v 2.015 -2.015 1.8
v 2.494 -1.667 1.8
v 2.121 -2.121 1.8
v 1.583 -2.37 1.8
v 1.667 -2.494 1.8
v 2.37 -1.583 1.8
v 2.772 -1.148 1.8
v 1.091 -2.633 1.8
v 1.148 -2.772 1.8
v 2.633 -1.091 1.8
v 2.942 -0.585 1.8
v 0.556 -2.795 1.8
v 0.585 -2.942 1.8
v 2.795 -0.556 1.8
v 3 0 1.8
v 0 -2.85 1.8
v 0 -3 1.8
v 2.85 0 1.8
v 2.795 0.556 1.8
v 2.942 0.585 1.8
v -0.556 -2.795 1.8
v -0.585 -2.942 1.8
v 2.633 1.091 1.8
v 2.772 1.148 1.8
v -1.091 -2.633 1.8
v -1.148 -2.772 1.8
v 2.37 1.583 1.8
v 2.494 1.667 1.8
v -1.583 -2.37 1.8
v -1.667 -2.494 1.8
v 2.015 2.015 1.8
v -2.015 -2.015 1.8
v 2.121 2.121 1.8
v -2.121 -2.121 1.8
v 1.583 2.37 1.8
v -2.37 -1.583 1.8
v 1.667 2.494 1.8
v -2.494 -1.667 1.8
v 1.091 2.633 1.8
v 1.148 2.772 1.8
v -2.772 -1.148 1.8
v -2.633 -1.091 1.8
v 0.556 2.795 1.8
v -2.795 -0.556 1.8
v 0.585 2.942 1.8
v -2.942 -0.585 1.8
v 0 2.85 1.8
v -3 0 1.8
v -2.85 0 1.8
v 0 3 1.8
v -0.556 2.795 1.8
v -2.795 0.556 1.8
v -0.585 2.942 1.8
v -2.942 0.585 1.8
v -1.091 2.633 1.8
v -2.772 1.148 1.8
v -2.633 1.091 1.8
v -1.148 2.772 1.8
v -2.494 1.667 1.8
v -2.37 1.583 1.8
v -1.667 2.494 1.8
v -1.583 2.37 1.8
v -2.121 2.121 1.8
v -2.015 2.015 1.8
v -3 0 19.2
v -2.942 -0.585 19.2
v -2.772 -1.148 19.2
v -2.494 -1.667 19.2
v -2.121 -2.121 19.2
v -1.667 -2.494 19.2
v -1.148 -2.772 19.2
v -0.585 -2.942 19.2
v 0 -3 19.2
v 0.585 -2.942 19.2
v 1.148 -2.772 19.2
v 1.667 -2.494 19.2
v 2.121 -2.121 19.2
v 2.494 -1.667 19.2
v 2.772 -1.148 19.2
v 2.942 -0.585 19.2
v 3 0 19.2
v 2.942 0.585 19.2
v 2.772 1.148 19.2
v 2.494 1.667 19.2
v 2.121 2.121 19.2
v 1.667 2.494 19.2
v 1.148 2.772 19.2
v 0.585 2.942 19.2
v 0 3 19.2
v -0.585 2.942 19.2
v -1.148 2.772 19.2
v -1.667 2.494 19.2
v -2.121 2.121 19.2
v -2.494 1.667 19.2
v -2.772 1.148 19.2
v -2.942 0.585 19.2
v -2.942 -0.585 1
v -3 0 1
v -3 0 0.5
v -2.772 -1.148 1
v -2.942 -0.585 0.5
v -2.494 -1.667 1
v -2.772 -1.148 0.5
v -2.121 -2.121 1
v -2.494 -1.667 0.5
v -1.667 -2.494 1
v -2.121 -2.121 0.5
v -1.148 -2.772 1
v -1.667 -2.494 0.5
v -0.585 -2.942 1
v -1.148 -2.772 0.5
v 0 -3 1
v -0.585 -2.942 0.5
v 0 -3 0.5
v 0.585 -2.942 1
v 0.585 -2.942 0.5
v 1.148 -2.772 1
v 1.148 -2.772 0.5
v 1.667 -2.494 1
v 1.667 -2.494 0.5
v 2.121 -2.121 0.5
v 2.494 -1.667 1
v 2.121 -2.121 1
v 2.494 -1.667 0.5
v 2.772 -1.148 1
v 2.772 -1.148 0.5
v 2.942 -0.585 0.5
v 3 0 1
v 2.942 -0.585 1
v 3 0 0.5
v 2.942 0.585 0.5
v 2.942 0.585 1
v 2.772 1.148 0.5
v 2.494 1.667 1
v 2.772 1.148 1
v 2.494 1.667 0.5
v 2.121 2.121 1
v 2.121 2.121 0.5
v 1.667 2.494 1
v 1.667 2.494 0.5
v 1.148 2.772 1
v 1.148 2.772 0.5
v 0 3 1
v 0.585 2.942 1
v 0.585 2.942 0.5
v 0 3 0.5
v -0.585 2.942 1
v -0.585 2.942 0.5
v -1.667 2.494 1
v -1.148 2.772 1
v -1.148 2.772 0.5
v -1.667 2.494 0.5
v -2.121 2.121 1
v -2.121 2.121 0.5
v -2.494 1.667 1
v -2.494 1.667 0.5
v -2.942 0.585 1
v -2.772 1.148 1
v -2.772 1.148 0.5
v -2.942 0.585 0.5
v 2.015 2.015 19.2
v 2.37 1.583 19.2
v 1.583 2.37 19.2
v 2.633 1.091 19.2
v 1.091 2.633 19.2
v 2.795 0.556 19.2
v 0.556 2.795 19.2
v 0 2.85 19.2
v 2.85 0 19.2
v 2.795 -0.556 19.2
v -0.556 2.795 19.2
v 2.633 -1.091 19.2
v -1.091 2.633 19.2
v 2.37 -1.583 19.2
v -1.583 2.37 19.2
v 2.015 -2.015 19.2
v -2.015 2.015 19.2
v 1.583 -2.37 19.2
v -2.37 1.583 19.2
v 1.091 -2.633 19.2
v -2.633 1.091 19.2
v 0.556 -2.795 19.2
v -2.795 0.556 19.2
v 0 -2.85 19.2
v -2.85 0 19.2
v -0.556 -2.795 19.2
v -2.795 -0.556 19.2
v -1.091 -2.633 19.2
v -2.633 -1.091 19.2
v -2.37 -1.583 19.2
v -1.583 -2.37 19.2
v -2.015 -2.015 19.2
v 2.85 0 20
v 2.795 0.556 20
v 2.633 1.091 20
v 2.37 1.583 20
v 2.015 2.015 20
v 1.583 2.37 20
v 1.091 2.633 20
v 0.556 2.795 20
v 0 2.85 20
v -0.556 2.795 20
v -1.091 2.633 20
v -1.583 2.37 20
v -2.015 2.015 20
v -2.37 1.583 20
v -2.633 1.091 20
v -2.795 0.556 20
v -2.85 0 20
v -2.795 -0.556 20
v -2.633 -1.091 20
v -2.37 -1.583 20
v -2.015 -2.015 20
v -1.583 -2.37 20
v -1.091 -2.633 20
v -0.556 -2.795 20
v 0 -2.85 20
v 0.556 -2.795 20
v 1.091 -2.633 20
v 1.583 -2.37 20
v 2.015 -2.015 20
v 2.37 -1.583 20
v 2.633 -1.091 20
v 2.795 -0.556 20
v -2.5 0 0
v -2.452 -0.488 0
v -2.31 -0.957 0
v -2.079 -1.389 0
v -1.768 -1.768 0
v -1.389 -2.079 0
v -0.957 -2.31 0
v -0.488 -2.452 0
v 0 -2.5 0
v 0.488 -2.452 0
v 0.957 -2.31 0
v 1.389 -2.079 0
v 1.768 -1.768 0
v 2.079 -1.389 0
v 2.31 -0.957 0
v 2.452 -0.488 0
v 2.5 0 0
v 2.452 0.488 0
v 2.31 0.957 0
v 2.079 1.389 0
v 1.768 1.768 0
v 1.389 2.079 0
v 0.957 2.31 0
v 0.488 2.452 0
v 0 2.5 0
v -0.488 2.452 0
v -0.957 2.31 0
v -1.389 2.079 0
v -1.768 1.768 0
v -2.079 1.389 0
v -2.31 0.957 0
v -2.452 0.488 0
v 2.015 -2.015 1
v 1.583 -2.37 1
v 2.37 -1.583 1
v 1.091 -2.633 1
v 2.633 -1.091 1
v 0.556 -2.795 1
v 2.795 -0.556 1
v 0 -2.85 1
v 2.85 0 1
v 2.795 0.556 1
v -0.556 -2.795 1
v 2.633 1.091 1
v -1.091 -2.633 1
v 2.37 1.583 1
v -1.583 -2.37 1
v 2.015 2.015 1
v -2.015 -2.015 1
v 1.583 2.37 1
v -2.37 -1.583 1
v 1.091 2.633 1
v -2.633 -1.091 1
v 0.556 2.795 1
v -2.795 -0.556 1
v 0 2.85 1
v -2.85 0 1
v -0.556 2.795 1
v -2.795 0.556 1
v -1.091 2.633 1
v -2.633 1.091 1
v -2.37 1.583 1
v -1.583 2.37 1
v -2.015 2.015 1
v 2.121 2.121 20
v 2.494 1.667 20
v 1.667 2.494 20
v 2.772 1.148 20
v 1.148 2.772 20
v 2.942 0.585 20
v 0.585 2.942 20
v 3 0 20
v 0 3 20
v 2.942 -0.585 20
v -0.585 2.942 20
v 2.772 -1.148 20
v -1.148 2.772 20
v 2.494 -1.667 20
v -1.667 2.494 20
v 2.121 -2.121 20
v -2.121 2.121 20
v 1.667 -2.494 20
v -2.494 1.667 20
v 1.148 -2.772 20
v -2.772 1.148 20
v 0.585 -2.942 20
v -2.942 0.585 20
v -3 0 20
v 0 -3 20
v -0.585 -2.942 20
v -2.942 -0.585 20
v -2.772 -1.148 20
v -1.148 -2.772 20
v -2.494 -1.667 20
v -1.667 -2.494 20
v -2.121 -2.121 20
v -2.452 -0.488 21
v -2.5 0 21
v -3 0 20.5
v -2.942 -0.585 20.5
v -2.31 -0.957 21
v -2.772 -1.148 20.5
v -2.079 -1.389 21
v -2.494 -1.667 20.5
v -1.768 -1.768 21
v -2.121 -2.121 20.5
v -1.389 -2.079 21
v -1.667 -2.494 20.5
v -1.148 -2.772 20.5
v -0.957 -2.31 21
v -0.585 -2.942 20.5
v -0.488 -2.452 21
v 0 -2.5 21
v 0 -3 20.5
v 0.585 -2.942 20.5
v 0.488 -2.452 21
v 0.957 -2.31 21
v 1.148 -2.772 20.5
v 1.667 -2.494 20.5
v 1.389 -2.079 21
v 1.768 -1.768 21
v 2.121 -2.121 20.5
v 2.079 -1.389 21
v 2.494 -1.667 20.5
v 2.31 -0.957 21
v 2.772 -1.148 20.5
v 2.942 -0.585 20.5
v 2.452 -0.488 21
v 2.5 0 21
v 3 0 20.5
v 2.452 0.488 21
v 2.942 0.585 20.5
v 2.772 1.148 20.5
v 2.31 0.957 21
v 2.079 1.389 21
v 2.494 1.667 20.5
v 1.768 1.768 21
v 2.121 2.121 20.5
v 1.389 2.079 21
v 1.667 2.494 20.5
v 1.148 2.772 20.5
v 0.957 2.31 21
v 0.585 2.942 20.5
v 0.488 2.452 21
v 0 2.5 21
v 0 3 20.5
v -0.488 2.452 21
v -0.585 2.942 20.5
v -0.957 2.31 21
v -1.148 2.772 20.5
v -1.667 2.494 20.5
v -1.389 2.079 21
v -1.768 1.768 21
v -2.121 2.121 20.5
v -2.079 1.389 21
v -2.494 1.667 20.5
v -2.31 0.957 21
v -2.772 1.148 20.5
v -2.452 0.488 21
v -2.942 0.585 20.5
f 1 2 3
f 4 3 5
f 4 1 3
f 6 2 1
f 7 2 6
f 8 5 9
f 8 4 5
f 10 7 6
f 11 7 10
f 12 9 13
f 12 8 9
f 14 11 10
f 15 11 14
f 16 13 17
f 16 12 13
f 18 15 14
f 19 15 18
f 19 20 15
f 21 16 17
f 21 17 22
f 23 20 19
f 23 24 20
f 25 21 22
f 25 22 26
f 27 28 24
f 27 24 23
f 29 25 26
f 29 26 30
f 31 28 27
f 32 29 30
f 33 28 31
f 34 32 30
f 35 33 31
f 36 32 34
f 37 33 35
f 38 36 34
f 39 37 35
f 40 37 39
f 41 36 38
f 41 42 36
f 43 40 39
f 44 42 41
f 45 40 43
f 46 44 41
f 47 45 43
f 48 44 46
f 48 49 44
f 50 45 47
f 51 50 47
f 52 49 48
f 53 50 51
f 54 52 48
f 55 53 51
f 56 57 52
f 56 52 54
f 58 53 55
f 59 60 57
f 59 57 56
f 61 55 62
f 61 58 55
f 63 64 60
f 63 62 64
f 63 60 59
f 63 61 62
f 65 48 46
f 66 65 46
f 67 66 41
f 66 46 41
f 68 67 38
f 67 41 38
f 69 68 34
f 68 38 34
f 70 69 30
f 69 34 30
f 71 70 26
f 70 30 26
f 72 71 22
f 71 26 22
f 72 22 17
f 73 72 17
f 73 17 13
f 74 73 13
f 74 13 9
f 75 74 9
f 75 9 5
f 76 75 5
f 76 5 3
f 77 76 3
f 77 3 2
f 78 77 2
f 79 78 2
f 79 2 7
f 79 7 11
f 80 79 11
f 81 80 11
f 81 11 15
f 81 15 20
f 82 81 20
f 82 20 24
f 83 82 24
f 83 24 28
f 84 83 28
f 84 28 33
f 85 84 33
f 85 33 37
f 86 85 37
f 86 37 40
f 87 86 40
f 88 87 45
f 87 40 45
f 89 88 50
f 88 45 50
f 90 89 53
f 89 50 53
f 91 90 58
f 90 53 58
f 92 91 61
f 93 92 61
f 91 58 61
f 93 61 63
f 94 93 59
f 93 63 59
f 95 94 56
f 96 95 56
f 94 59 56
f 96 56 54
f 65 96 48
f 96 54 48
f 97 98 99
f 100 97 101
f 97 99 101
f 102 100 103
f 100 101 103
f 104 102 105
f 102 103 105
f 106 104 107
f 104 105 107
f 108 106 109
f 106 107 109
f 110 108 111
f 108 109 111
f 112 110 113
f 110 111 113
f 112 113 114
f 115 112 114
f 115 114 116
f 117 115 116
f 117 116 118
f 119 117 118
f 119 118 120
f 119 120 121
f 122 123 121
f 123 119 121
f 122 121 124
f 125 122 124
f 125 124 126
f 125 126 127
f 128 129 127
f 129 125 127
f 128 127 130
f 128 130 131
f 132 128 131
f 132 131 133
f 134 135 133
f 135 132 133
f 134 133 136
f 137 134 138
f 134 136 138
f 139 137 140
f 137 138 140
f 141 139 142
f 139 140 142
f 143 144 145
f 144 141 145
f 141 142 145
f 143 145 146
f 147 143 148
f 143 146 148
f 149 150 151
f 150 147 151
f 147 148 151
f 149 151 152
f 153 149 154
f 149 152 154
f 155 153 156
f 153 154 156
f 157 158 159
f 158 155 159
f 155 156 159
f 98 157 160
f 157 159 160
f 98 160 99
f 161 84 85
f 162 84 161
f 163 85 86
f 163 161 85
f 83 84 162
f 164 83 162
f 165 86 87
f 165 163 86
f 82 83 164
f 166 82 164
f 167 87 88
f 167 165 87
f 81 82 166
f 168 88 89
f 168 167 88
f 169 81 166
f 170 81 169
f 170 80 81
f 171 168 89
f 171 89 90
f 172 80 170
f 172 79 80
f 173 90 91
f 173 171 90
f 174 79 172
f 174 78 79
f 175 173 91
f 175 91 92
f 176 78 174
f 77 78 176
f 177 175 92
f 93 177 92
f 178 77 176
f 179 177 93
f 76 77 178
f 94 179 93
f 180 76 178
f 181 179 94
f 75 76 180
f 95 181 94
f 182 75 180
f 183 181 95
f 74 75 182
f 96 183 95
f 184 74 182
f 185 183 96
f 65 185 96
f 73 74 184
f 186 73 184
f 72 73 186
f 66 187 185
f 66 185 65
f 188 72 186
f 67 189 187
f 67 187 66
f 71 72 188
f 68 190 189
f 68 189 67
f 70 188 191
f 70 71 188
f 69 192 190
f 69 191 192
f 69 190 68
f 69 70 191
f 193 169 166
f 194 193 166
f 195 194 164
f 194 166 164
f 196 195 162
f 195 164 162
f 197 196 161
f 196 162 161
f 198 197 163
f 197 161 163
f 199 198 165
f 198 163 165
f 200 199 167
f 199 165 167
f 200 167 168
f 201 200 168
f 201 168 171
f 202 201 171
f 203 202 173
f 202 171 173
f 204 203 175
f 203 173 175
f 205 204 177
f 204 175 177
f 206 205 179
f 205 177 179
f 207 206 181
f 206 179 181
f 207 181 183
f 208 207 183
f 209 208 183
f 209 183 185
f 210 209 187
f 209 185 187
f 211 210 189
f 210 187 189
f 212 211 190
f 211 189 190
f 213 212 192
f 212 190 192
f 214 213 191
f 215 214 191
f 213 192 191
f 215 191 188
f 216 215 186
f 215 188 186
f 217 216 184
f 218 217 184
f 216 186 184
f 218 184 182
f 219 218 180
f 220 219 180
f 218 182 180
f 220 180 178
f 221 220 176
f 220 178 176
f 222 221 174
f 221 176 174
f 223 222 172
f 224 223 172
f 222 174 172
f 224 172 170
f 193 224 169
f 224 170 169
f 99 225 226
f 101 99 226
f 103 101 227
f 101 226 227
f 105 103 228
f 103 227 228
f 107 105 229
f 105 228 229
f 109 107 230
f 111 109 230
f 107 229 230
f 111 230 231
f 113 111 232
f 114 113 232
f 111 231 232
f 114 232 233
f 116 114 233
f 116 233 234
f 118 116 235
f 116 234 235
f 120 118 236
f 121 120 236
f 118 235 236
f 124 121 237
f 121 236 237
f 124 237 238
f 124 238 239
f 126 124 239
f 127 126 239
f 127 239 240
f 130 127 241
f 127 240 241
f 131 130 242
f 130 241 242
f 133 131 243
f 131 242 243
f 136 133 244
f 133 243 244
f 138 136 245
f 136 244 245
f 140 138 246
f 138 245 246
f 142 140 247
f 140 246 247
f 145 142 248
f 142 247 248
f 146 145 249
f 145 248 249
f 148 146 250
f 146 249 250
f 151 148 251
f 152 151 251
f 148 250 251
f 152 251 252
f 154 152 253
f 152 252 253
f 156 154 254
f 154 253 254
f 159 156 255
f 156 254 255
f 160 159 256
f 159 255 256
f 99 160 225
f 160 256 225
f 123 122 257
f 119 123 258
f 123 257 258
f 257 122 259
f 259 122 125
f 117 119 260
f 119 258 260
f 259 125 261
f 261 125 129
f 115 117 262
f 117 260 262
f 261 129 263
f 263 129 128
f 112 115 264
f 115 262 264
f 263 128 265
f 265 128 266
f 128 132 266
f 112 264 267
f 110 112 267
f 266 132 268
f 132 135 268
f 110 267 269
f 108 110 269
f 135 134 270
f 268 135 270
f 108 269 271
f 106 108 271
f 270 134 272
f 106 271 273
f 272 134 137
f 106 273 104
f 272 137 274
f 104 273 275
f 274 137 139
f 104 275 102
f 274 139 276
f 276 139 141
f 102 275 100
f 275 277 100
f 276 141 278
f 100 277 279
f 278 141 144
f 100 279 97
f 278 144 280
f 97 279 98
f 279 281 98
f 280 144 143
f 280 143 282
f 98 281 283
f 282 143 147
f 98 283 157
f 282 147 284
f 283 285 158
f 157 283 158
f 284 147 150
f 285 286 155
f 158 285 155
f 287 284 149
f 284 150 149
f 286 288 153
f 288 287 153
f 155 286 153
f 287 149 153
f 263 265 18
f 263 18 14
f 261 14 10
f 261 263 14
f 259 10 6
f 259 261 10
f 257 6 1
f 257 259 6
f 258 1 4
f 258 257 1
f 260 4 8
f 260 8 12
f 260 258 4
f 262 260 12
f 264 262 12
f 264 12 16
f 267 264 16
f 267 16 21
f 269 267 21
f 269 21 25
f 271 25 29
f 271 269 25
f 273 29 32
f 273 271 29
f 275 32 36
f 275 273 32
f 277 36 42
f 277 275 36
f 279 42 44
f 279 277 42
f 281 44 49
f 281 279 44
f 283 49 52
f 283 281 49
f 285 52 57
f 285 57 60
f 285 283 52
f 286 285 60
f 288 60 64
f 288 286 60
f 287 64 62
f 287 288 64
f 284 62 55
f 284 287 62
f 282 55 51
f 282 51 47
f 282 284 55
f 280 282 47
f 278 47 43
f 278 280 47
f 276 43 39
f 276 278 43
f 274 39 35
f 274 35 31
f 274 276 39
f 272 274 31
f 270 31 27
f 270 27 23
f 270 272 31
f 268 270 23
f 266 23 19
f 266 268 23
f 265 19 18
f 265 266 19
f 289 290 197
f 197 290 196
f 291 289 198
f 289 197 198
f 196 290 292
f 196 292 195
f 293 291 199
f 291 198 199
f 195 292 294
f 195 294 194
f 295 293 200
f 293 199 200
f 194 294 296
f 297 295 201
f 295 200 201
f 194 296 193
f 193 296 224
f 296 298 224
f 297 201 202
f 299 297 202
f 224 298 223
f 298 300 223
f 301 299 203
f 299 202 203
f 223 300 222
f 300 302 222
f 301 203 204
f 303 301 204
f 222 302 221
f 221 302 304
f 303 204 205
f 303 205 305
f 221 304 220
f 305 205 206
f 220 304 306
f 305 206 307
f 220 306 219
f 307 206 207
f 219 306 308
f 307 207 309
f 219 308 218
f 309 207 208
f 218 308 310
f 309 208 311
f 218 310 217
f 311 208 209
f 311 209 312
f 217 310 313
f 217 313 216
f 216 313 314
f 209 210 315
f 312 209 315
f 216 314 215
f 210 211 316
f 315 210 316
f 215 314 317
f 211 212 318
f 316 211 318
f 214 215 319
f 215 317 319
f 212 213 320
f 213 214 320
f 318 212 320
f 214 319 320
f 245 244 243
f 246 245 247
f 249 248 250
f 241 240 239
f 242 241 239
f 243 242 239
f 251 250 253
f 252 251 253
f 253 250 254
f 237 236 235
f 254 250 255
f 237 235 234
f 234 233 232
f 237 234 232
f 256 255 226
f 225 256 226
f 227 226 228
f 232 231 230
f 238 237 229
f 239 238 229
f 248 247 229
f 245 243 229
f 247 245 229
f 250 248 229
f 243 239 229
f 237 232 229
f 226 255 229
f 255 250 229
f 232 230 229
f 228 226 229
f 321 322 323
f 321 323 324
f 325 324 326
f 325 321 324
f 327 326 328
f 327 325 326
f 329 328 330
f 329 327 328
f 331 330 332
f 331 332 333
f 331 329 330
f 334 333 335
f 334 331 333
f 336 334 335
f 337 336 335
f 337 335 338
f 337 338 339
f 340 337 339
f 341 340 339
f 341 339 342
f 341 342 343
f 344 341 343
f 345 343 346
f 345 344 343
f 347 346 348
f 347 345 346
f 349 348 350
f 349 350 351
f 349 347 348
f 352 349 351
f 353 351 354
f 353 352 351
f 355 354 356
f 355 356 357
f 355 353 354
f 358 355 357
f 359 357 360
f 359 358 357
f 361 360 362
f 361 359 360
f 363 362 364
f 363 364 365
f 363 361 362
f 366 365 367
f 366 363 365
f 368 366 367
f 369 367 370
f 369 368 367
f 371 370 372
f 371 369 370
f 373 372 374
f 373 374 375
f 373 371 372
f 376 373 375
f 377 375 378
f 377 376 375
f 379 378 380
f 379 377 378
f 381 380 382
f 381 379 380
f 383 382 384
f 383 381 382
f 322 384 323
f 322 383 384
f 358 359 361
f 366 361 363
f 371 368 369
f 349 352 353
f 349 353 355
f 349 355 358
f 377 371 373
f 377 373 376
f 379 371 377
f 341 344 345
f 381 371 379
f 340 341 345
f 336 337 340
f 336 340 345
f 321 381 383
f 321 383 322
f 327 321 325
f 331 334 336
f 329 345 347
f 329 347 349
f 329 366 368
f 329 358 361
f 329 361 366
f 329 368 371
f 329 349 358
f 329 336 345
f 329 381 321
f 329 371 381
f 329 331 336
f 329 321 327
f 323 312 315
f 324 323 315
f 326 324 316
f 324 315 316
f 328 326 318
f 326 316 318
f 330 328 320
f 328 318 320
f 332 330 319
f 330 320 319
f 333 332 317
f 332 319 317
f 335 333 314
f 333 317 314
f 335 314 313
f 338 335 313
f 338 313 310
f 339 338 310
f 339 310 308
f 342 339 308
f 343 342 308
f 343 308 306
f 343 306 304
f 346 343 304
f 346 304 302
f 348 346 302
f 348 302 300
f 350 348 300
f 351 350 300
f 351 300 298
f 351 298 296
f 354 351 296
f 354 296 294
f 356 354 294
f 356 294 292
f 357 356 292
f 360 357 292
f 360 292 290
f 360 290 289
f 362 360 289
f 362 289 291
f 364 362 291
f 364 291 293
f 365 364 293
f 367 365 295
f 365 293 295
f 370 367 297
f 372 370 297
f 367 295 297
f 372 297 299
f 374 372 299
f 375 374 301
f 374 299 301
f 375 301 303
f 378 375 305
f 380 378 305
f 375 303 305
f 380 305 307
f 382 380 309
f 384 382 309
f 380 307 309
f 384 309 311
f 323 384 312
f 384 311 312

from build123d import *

# Parameters (mm, degrees)
SZKIC1_R                    = 3
DODANIE_WYCI_GNI_CIE1_DEPTH = 21
SFAZOWANIE1_SIZE            = 0.5
WYTNIJ_WYCI_GNI_CIE1_START  = -1.8
SZKIC2_R                    = 3
SZKIC2_R_2                  = 2.85
WYTNIJ_WYCI_GNI_CIE1_DEPTH  = 0.8
WYTNIJ_WYCI_GNI_CIE2_START  = -1
SZKIC3_R                    = 3
SZKIC3_R_2                  = 2.85
WYTNIJ_WYCI_GNI_CIE2_DEPTH  = 0.8


with BuildPart() as part:
    # Szkic1 → Dodanie-wyciągnięcie1 (new body)
    with BuildSketch(Plane.XY):
        with Locations(Location((0, 0, 0), (0, 0, 180))):
            Circle(SZKIC1_R)
    extrude(amount=DODANIE_WYCI_GNI_CIE1_DEPTH)

    # Sfazowanie1
    sfazowanie1_edges = [part.edges().sort_by_distance(p)[0] for p in [
        (3, 0, 0),
        (3, 0, 21),
    ]]
    chamfer(sfazowanie1_edges, length=SFAZOWANIE1_SIZE)

    # Szkic2 → Wytnij-wyciągnięcie1 (cut)
    with BuildSketch(Plane.XY.offset(21).offset(WYTNIJ_WYCI_GNI_CIE1_START)):
        with Locations(Location((0, 0, 0), (0, 0, 180))):
            Circle(SZKIC2_R)
        Circle(SZKIC2_R_2, mode=Mode.SUBTRACT)
    extrude(amount=WYTNIJ_WYCI_GNI_CIE1_DEPTH, mode=Mode.SUBTRACT)

    # Szkic3 → Wytnij-wyciągnięcie2 (cut)
    with BuildSketch(Plane(origin=(0, 0, 0), x_dir=(-1, 0, 0), z_dir=(0, 0, -1)).offset(WYTNIJ_WYCI_GNI_CIE2_START)):
        Circle(SZKIC3_R)
        with Locations(Location((0, 0, 0), (0, 0, 180))):
            Circle(SZKIC3_R_2, mode=Mode.SUBTRACT)
    extrude(amount=-WYTNIJ_WYCI_GNI_CIE2_DEPTH, mode=Mode.SUBTRACT)


solid = part.part
